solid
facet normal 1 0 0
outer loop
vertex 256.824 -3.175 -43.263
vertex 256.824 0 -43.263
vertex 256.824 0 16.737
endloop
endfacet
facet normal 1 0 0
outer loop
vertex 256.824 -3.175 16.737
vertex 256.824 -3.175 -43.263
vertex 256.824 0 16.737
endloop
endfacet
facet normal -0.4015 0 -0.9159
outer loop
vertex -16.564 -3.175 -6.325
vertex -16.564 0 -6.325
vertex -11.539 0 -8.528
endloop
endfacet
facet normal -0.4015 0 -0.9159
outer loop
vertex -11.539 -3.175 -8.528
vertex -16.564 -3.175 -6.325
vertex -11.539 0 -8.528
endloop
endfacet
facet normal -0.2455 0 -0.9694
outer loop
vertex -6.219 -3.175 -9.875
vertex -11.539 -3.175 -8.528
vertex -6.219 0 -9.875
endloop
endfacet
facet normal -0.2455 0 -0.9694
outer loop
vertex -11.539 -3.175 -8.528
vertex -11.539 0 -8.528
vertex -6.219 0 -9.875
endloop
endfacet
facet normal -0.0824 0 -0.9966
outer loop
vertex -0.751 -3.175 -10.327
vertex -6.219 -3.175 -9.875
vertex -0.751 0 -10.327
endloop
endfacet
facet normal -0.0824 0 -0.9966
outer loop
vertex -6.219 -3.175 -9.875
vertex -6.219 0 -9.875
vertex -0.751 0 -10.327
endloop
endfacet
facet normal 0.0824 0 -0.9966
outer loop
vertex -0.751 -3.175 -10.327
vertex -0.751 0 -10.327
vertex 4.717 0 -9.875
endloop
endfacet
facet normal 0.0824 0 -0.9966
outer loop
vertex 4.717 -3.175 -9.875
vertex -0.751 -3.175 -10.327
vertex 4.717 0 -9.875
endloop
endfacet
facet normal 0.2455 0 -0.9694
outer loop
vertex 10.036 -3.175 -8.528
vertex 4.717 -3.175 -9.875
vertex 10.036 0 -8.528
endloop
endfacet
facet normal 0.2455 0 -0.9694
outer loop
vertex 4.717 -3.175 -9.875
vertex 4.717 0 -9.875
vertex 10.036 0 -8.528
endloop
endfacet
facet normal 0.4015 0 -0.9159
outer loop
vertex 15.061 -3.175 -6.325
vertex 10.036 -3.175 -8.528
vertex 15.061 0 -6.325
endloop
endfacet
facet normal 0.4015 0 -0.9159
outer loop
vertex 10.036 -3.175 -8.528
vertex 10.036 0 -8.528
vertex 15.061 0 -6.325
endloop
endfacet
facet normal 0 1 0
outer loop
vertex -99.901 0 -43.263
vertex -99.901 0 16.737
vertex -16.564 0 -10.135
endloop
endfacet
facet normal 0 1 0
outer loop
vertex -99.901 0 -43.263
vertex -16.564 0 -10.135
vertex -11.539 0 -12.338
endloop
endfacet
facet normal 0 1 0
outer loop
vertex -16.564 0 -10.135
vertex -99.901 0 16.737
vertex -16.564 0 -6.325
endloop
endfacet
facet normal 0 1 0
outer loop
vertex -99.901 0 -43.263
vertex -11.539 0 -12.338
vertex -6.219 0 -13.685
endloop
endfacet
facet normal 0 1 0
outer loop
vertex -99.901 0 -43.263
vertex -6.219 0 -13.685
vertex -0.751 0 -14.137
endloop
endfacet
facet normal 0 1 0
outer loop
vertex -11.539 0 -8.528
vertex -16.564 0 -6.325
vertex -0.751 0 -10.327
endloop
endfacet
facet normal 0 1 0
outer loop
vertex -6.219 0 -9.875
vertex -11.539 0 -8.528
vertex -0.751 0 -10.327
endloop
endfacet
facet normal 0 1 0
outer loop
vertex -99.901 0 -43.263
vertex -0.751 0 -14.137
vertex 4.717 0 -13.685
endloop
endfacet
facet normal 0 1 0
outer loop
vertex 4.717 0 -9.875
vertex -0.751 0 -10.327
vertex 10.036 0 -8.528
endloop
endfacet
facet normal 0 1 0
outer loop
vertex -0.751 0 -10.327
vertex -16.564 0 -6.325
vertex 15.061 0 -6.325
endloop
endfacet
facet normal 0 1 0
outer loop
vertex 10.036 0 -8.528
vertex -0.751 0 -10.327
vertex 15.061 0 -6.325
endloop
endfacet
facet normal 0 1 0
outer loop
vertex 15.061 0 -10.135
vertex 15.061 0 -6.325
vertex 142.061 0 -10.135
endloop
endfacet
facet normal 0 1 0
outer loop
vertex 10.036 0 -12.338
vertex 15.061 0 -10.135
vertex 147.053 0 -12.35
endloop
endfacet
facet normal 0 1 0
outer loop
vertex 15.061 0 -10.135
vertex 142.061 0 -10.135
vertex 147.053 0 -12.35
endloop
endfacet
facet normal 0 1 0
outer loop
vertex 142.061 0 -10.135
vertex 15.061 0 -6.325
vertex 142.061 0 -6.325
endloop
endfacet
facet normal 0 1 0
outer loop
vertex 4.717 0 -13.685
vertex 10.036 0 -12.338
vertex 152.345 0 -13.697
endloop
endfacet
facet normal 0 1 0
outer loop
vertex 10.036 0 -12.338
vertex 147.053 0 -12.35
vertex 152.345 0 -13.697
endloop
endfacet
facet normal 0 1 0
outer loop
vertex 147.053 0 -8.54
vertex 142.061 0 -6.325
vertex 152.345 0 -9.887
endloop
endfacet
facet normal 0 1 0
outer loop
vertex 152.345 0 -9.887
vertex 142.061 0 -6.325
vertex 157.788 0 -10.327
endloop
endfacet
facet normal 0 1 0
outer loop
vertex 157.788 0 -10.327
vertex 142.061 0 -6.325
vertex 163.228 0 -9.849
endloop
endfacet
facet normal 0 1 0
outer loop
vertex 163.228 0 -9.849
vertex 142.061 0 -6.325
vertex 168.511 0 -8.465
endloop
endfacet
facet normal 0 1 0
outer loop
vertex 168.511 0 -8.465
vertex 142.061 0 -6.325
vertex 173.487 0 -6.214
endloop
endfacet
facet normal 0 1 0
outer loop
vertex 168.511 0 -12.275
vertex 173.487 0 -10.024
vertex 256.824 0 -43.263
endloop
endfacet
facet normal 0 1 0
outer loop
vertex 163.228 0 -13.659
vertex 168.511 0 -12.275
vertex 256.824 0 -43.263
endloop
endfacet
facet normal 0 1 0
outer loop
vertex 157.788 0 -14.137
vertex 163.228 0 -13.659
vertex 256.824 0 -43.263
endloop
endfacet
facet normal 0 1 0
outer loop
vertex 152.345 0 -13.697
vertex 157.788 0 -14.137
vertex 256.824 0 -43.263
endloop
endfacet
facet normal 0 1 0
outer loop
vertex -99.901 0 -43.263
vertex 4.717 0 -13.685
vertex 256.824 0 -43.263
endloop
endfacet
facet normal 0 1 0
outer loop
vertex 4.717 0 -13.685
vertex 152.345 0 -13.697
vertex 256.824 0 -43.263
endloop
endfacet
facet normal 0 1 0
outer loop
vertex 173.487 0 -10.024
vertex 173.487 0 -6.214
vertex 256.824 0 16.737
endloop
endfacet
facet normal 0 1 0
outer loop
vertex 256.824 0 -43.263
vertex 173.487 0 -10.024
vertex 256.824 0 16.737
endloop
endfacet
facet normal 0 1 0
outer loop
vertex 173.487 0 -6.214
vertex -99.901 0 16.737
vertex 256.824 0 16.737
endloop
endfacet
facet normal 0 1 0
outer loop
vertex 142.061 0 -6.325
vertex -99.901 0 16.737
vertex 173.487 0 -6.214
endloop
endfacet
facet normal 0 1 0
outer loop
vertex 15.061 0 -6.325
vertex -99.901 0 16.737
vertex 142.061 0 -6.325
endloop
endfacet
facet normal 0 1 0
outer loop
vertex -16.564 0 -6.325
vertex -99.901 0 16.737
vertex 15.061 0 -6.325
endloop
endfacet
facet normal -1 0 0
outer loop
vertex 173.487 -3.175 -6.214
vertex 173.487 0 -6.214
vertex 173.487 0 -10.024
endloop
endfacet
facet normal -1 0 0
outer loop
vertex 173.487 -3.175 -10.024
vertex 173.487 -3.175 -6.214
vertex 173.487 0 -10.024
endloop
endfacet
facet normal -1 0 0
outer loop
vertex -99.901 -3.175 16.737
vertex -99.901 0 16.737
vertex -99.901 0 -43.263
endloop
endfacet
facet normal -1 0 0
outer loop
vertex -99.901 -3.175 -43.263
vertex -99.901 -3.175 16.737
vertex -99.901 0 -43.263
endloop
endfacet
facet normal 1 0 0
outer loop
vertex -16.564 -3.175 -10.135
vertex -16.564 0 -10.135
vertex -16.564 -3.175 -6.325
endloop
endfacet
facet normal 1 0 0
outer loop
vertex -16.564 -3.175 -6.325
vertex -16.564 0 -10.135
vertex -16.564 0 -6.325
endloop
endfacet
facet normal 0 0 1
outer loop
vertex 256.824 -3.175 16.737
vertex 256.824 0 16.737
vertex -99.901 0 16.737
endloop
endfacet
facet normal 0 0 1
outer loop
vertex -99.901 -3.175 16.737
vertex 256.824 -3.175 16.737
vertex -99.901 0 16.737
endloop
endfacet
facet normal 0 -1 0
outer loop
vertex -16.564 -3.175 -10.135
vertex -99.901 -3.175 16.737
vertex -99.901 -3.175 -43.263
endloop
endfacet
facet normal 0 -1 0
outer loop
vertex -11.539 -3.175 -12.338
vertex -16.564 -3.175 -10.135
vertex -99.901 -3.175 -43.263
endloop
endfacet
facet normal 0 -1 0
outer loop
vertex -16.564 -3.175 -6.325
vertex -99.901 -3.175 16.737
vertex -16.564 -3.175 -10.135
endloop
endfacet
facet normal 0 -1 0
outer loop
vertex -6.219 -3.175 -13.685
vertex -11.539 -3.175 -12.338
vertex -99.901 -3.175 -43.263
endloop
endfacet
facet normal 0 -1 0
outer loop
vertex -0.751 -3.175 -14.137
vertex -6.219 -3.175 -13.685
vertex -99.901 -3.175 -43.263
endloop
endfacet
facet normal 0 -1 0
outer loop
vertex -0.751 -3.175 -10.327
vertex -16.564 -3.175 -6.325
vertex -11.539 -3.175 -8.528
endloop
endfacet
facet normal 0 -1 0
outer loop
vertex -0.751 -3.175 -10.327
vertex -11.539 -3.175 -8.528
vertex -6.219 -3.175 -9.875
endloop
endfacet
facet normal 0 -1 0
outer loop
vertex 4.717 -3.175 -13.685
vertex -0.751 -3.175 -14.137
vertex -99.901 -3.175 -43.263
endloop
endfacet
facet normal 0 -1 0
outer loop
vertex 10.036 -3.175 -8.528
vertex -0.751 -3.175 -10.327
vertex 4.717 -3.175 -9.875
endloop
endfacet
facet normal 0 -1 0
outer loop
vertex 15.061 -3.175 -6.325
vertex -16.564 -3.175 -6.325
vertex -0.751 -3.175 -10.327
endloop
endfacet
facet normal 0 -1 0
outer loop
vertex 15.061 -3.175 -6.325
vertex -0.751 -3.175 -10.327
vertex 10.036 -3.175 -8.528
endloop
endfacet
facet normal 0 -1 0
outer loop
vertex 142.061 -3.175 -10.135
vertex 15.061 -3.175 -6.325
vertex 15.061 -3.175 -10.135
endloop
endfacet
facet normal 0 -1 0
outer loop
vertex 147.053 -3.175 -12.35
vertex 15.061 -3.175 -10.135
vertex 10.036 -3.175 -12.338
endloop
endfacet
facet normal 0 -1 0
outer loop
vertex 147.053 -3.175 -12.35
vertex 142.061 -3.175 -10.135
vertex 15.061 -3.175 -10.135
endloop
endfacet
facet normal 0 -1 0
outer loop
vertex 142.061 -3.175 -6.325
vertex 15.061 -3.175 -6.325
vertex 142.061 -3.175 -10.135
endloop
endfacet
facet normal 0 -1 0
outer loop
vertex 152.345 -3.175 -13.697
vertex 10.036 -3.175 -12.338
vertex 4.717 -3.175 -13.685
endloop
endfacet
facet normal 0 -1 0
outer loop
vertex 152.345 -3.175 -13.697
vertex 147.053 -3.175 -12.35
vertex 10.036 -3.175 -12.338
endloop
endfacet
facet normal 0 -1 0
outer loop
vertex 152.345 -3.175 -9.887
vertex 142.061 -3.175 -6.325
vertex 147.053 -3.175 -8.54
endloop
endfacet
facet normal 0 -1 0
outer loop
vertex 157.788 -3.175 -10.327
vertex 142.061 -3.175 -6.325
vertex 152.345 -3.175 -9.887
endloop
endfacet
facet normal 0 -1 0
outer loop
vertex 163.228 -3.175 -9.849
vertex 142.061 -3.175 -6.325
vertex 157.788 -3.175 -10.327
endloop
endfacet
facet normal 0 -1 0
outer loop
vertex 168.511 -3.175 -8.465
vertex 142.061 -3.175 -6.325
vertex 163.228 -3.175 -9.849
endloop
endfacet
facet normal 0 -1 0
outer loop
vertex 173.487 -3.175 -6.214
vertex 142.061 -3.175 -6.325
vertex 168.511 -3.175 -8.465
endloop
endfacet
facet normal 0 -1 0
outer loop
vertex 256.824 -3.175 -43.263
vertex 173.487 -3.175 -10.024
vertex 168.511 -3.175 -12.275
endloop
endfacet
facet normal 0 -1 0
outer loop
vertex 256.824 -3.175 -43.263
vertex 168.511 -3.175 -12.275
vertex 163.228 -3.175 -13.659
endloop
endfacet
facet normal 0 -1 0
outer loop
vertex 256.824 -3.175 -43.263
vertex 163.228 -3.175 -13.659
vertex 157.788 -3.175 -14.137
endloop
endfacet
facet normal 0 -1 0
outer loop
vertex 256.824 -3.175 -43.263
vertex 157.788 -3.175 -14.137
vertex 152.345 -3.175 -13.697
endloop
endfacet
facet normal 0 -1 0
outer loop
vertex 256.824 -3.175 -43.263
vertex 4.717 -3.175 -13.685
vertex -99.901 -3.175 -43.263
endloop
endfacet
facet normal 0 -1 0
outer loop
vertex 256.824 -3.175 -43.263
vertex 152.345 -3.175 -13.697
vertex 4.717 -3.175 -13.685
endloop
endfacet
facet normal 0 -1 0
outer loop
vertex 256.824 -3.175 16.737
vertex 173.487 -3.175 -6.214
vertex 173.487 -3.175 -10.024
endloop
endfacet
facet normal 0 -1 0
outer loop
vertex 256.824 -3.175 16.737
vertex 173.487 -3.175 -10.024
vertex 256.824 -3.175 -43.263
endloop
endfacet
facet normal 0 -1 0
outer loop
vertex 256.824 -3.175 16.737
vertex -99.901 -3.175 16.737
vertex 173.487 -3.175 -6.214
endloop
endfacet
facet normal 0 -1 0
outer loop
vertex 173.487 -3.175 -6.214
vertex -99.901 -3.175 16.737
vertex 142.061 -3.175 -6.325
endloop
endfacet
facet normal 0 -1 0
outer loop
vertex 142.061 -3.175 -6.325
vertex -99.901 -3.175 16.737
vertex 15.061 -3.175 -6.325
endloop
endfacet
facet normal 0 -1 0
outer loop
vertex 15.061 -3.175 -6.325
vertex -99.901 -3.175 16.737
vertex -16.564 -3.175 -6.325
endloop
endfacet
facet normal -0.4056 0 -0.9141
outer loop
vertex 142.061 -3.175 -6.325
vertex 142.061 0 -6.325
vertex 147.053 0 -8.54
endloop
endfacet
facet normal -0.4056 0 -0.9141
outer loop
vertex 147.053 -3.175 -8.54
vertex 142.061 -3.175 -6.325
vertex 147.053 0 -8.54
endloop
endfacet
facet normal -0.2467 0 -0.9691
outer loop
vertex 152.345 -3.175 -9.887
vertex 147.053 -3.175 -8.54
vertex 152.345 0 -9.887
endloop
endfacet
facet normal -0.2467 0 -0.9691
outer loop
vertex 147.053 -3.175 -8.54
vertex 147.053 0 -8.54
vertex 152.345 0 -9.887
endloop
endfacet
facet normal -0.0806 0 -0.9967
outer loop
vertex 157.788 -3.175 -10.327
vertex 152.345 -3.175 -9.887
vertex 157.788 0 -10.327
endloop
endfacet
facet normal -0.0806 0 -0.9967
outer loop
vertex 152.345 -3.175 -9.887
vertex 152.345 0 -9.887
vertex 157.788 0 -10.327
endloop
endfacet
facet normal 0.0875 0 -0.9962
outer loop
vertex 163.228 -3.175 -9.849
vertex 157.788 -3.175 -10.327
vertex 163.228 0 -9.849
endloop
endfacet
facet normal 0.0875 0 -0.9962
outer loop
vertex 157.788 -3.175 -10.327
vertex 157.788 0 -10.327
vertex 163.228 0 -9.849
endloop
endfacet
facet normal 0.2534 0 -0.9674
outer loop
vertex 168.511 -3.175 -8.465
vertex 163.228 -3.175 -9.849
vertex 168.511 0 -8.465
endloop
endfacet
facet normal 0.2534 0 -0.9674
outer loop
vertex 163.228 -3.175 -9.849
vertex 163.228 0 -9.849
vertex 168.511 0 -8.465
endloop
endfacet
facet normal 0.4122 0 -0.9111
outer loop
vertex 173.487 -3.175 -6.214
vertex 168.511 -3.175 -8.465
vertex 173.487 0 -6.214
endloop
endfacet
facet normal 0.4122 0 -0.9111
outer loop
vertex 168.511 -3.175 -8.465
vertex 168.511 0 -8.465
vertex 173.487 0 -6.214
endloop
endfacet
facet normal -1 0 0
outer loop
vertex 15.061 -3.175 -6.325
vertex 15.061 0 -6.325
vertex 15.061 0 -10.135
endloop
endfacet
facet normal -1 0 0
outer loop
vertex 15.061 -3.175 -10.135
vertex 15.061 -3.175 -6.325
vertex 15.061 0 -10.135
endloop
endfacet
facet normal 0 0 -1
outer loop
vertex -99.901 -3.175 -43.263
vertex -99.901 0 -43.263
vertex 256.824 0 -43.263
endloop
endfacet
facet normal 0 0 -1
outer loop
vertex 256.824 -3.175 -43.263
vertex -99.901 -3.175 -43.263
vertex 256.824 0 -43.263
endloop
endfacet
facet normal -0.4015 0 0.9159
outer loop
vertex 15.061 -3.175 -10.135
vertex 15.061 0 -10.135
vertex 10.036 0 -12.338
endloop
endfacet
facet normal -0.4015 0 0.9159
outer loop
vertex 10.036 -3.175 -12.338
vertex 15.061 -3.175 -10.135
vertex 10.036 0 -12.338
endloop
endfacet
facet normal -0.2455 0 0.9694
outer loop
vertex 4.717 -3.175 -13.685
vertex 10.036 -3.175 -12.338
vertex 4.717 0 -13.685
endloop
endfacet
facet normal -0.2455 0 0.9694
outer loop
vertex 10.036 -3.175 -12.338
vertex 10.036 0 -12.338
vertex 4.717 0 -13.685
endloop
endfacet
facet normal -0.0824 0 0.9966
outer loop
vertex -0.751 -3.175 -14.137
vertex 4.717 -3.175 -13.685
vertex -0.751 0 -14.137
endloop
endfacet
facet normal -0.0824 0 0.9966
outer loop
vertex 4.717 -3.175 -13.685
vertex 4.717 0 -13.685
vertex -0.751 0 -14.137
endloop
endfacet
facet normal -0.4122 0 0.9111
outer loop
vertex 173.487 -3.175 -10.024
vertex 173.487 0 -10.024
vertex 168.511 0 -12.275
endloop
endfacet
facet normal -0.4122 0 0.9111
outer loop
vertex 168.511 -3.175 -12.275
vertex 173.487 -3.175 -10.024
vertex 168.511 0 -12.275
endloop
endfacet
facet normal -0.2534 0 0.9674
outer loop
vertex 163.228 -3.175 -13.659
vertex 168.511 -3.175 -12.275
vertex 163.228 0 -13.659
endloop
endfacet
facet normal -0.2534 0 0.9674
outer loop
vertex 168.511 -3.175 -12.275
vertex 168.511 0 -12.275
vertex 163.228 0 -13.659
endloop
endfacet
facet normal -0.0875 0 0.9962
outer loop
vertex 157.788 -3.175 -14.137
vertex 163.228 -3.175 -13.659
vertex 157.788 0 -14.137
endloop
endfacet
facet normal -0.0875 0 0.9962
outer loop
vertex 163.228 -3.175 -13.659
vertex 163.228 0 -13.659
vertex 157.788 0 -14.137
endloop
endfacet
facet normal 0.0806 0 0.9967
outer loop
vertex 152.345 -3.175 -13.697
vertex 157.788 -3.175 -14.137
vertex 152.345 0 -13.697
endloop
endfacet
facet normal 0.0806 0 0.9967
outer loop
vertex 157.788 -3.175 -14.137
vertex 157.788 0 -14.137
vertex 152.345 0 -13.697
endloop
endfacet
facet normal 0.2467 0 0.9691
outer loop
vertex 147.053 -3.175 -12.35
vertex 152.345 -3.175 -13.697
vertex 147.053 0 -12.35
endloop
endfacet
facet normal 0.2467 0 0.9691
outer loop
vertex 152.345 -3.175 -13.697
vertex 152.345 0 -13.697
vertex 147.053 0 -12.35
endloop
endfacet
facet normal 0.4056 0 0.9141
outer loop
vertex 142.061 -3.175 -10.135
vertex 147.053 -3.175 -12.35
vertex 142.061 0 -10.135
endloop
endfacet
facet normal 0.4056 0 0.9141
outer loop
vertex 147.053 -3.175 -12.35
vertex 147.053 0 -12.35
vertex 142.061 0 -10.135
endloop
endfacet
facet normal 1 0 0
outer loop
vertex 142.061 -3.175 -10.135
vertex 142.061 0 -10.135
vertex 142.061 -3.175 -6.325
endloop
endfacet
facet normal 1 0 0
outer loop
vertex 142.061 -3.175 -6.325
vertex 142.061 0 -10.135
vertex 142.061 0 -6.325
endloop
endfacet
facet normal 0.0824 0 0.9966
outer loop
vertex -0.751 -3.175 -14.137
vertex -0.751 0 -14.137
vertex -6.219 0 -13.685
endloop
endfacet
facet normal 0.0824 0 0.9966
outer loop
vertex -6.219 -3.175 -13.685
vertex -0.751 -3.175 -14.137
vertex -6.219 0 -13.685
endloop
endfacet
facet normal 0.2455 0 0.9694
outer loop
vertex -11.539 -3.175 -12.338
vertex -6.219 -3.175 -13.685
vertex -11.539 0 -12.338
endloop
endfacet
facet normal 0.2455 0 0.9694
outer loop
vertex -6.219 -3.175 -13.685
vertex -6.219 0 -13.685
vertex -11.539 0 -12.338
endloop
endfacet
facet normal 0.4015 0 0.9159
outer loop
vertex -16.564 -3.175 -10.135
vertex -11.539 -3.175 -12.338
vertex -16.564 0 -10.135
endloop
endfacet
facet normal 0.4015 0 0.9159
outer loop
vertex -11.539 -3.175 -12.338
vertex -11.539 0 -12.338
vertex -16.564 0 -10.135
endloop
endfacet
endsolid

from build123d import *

# Parameters (mm, degrees)
F1_DEPTH = 3.175


with BuildPart() as f1:
    # F0 (on Front) → F1 (new body)
    with BuildSketch(Plane.XZ):
        Polygon((98.386274, 16.736827), (-51.613726, 16.736827), (-99.901127, 16.736827), (-99.901127, -43.263173), (-51.613726, -43.263173), (98.386274, -43.263173), (256.824182, -43.263173), (256.824182, 16.736827), align=None)
        with BuildLine():
            Line((-16.563727, -10.134648), (-16.563727, -6.324648))
            ThreePointArc((-16.563727, -6.324648), (-8.906867, -9.311239), (-0.751226, -10.327486))
            ThreePointArc((-0.751226, -10.327486), (7.404414, -9.311239), (15.061274, -6.324648))
            Line((15.061274, -6.324648), (15.061274, -10.134648))
            ThreePointArc((15.061274, -10.134648), (7.404414, -13.121239), (-0.751226, -14.137486))
            ThreePointArc((-0.751226, -14.137486), (-8.906867, -13.121239), (-16.563727, -10.134648))
        make_face(mode=Mode.SUBTRACT)
        with BuildLine():
            Line((142.061274, -10.134648), (142.061274, -6.324648))
            ThreePointArc((142.061274, -6.324648), (157.788284, -10.327282), (173.486782, -6.214243))
            Line((173.486782, -6.214243), (173.486782, -10.024243))
            ThreePointArc((173.486782, -10.024243), (157.788284, -14.137275), (142.061274, -10.134648))
        make_face(mode=Mode.SUBTRACT)
    extrude(amount=F1_DEPTH)


solid = f1.part
